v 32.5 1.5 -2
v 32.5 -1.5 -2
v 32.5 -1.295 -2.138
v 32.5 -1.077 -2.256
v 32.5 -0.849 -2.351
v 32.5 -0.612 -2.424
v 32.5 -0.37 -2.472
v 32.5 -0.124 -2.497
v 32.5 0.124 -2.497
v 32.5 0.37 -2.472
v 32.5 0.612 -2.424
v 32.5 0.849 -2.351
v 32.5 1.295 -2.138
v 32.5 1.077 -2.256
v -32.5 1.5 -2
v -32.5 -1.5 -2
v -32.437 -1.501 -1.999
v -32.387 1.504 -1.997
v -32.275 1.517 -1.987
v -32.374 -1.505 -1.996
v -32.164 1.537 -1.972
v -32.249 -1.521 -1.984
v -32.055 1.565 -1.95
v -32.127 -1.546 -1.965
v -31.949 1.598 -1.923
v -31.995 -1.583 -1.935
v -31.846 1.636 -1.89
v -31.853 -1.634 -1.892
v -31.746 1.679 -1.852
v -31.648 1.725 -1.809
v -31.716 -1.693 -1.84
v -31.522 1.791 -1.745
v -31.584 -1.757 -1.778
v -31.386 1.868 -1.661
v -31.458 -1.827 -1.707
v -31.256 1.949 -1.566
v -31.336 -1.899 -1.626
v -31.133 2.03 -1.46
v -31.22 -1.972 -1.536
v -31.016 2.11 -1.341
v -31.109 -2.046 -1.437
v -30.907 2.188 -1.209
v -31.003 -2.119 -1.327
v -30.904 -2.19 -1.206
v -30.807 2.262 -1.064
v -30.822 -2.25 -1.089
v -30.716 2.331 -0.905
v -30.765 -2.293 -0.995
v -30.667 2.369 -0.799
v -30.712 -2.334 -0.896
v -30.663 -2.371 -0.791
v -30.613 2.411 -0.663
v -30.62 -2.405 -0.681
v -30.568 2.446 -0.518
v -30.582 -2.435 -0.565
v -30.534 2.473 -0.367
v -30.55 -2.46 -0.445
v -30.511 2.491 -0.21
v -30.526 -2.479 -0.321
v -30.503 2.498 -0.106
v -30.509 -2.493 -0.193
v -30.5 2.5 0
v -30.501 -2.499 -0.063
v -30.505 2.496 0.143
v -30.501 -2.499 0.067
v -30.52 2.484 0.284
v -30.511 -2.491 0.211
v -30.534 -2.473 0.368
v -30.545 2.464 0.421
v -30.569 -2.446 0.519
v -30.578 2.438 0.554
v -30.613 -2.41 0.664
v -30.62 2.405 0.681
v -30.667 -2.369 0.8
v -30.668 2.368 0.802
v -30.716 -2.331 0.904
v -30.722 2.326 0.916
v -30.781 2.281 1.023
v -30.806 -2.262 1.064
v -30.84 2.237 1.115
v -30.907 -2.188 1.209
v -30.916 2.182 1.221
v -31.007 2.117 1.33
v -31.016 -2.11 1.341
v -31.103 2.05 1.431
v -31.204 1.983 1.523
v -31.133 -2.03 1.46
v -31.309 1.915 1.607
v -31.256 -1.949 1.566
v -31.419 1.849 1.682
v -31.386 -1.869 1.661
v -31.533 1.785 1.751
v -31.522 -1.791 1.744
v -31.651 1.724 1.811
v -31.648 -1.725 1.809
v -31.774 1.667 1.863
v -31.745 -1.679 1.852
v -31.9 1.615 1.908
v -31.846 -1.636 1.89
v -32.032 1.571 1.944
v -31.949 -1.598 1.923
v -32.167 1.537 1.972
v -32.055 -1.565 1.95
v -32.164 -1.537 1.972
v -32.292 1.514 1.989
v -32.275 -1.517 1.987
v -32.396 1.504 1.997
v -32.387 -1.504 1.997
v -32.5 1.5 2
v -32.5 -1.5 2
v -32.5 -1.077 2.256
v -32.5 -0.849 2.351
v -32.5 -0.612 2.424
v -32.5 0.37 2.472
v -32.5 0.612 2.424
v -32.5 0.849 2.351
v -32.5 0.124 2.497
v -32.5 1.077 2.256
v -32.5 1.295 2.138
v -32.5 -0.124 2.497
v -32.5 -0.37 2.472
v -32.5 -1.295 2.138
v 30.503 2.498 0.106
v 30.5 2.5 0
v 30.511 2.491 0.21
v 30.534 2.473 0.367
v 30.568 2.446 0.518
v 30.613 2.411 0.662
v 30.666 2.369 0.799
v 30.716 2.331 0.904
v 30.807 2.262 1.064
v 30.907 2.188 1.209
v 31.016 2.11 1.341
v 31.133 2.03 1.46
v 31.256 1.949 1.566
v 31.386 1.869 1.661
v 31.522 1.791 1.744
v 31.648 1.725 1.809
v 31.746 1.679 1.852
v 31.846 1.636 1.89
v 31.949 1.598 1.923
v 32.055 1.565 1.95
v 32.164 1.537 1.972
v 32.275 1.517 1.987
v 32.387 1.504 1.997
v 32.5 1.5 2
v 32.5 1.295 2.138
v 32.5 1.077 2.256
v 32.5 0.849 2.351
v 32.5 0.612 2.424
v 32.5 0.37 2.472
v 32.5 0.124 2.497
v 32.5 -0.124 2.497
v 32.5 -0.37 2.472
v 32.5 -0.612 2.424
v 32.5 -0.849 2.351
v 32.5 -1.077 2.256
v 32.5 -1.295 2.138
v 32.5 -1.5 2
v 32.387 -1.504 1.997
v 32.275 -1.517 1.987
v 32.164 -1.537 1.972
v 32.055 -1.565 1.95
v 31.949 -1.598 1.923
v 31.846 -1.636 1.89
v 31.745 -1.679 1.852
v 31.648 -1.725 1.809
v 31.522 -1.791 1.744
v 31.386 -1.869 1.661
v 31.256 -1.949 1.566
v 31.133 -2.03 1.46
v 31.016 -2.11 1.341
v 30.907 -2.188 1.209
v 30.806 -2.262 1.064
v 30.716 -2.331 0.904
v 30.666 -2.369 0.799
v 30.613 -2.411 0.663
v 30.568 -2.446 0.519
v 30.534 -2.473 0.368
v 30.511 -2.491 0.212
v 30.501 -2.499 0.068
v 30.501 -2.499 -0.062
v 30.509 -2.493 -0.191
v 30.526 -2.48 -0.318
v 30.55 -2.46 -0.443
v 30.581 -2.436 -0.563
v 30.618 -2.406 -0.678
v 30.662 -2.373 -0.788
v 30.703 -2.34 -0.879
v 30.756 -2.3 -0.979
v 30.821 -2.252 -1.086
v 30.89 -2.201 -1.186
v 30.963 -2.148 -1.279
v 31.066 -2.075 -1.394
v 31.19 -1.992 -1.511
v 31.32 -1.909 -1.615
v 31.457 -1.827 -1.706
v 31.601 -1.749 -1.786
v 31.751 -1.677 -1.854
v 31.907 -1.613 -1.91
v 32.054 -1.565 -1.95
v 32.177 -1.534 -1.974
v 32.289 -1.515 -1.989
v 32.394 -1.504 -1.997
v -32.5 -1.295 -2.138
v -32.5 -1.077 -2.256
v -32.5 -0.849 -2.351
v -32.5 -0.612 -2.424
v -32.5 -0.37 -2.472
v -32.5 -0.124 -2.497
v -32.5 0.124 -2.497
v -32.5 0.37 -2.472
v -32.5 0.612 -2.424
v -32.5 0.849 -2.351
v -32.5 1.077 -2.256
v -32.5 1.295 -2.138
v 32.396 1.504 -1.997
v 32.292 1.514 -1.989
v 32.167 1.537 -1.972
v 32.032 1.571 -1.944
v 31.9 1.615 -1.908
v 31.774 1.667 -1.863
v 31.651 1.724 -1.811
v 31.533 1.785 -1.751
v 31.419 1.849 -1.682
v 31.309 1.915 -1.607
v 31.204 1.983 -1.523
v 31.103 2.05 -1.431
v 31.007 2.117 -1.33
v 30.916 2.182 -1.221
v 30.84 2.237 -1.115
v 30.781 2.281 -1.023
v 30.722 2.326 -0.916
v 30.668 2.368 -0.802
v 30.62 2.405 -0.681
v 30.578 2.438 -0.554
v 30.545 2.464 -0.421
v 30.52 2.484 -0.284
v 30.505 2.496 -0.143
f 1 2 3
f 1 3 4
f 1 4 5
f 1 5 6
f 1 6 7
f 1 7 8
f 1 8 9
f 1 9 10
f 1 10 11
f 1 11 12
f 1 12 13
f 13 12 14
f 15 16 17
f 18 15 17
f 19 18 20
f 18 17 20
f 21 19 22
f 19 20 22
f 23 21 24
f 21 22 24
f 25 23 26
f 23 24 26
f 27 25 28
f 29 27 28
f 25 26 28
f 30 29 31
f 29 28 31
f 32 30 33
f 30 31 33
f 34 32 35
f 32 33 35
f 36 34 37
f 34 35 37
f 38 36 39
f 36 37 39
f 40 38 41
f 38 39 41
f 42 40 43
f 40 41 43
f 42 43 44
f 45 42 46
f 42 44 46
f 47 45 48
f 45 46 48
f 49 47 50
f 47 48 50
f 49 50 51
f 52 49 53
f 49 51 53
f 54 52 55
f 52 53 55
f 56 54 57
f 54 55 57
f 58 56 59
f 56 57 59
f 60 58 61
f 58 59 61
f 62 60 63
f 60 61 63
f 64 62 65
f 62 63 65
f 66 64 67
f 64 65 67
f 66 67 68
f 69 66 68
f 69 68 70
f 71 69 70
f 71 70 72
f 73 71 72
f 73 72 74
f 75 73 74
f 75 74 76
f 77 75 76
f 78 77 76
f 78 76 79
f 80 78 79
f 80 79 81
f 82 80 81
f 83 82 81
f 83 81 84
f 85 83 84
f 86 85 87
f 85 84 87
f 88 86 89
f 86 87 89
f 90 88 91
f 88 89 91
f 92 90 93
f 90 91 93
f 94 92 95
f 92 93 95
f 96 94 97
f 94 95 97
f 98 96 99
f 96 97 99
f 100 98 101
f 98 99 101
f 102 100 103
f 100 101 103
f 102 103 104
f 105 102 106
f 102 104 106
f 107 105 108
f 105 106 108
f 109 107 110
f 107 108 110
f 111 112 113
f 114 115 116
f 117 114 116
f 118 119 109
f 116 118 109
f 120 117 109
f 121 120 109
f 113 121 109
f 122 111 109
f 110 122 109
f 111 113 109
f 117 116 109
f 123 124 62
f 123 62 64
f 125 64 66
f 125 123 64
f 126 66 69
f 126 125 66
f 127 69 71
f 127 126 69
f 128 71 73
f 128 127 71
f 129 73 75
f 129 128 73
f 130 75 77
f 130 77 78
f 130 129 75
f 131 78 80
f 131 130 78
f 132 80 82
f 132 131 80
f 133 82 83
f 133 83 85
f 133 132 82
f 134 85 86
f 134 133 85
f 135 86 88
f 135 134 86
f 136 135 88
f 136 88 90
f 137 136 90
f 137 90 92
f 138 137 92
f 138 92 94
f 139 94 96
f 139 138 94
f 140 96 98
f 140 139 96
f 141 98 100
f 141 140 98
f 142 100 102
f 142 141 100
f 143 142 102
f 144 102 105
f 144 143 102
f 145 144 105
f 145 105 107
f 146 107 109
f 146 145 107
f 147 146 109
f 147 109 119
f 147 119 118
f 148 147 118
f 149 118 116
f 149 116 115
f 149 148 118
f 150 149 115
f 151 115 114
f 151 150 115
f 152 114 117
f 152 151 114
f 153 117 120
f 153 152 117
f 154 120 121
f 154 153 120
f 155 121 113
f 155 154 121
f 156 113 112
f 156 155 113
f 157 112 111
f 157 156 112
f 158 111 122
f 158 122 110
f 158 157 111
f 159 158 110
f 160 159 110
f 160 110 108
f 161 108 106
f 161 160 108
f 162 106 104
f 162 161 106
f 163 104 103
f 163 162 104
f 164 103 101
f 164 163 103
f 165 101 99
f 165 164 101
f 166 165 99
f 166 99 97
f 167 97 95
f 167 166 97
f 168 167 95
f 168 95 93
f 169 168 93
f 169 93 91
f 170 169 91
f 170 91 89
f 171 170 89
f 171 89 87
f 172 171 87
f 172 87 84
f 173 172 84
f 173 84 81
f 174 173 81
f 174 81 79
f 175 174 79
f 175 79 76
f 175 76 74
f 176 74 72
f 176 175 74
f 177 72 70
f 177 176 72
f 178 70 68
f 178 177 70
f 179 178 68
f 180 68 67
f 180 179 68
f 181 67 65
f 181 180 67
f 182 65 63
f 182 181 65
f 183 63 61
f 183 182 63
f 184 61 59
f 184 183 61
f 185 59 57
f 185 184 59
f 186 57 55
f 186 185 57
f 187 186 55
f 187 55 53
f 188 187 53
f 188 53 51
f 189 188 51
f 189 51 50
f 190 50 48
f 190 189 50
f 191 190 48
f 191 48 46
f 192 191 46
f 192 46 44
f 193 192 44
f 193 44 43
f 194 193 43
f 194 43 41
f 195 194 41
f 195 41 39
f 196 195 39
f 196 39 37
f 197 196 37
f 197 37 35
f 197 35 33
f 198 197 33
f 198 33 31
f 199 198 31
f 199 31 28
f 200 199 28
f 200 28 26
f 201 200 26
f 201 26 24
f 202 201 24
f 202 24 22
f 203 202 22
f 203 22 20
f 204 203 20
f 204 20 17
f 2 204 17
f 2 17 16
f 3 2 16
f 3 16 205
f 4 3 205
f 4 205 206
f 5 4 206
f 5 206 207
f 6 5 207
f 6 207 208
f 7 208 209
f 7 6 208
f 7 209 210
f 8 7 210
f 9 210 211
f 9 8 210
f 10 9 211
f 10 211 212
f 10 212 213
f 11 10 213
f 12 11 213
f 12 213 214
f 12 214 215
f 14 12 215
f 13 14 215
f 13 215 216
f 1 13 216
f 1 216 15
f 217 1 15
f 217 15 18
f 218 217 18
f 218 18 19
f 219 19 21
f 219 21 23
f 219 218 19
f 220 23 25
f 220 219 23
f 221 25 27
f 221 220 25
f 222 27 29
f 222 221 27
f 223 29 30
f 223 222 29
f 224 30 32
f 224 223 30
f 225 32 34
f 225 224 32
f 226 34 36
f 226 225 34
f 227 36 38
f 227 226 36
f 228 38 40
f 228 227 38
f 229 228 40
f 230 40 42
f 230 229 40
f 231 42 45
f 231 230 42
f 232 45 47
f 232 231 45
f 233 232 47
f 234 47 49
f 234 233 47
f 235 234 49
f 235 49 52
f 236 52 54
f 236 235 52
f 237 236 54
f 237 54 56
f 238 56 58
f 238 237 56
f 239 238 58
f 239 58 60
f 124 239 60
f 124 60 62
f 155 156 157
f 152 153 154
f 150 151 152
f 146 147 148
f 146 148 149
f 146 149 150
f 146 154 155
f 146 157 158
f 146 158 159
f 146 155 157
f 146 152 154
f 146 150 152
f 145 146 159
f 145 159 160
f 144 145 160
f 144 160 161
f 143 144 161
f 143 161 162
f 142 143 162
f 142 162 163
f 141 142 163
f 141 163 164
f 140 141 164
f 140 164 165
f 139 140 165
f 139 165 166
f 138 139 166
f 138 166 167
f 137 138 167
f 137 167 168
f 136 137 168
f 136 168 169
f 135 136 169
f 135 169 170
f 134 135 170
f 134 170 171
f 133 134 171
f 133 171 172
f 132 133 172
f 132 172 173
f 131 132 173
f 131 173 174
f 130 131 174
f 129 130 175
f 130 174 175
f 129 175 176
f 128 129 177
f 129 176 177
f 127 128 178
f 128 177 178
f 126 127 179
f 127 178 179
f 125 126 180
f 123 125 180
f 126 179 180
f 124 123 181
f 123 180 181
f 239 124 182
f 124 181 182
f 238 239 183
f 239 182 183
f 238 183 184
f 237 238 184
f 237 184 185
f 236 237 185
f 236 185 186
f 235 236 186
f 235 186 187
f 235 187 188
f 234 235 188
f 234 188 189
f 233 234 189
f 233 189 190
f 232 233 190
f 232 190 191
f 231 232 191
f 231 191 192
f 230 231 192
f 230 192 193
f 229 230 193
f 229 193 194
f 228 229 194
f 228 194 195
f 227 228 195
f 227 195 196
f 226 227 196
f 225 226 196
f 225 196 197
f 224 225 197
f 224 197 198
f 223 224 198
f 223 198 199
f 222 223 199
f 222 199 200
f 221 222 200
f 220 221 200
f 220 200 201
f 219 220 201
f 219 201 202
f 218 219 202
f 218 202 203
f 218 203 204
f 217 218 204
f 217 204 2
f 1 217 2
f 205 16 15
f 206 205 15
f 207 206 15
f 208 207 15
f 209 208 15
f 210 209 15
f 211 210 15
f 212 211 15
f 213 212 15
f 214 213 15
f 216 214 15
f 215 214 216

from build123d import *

# Parameters (mm, degrees)
F1_R          = 2.5
F2_DEPTH      = 32.5
F3_R          = 2
F4_DEPTH      = 2.501
F4_DEPTH_BACK = 2.501


with BuildPart() as f2:
    # F1 (on Right) → F2 (new body, symmetric)
    with BuildSketch(Plane.YZ):
        Circle(F1_R)
    extrude(amount=F2_DEPTH, both=True)

    # F3 (on Front) → F4 (cut, two sides)
    with BuildSketch(Plane.XZ) as f4_sk:
        with Locations((-32.5, 0)):
            Circle(F3_R)
        with Locations((32.5, 0)):
            Circle(F3_R)
    extrude(amount=-F4_DEPTH, mode=Mode.SUBTRACT)
    extrude(f4_sk.sketch, amount=F4_DEPTH_BACK, mode=Mode.SUBTRACT)


solid = f2.part
